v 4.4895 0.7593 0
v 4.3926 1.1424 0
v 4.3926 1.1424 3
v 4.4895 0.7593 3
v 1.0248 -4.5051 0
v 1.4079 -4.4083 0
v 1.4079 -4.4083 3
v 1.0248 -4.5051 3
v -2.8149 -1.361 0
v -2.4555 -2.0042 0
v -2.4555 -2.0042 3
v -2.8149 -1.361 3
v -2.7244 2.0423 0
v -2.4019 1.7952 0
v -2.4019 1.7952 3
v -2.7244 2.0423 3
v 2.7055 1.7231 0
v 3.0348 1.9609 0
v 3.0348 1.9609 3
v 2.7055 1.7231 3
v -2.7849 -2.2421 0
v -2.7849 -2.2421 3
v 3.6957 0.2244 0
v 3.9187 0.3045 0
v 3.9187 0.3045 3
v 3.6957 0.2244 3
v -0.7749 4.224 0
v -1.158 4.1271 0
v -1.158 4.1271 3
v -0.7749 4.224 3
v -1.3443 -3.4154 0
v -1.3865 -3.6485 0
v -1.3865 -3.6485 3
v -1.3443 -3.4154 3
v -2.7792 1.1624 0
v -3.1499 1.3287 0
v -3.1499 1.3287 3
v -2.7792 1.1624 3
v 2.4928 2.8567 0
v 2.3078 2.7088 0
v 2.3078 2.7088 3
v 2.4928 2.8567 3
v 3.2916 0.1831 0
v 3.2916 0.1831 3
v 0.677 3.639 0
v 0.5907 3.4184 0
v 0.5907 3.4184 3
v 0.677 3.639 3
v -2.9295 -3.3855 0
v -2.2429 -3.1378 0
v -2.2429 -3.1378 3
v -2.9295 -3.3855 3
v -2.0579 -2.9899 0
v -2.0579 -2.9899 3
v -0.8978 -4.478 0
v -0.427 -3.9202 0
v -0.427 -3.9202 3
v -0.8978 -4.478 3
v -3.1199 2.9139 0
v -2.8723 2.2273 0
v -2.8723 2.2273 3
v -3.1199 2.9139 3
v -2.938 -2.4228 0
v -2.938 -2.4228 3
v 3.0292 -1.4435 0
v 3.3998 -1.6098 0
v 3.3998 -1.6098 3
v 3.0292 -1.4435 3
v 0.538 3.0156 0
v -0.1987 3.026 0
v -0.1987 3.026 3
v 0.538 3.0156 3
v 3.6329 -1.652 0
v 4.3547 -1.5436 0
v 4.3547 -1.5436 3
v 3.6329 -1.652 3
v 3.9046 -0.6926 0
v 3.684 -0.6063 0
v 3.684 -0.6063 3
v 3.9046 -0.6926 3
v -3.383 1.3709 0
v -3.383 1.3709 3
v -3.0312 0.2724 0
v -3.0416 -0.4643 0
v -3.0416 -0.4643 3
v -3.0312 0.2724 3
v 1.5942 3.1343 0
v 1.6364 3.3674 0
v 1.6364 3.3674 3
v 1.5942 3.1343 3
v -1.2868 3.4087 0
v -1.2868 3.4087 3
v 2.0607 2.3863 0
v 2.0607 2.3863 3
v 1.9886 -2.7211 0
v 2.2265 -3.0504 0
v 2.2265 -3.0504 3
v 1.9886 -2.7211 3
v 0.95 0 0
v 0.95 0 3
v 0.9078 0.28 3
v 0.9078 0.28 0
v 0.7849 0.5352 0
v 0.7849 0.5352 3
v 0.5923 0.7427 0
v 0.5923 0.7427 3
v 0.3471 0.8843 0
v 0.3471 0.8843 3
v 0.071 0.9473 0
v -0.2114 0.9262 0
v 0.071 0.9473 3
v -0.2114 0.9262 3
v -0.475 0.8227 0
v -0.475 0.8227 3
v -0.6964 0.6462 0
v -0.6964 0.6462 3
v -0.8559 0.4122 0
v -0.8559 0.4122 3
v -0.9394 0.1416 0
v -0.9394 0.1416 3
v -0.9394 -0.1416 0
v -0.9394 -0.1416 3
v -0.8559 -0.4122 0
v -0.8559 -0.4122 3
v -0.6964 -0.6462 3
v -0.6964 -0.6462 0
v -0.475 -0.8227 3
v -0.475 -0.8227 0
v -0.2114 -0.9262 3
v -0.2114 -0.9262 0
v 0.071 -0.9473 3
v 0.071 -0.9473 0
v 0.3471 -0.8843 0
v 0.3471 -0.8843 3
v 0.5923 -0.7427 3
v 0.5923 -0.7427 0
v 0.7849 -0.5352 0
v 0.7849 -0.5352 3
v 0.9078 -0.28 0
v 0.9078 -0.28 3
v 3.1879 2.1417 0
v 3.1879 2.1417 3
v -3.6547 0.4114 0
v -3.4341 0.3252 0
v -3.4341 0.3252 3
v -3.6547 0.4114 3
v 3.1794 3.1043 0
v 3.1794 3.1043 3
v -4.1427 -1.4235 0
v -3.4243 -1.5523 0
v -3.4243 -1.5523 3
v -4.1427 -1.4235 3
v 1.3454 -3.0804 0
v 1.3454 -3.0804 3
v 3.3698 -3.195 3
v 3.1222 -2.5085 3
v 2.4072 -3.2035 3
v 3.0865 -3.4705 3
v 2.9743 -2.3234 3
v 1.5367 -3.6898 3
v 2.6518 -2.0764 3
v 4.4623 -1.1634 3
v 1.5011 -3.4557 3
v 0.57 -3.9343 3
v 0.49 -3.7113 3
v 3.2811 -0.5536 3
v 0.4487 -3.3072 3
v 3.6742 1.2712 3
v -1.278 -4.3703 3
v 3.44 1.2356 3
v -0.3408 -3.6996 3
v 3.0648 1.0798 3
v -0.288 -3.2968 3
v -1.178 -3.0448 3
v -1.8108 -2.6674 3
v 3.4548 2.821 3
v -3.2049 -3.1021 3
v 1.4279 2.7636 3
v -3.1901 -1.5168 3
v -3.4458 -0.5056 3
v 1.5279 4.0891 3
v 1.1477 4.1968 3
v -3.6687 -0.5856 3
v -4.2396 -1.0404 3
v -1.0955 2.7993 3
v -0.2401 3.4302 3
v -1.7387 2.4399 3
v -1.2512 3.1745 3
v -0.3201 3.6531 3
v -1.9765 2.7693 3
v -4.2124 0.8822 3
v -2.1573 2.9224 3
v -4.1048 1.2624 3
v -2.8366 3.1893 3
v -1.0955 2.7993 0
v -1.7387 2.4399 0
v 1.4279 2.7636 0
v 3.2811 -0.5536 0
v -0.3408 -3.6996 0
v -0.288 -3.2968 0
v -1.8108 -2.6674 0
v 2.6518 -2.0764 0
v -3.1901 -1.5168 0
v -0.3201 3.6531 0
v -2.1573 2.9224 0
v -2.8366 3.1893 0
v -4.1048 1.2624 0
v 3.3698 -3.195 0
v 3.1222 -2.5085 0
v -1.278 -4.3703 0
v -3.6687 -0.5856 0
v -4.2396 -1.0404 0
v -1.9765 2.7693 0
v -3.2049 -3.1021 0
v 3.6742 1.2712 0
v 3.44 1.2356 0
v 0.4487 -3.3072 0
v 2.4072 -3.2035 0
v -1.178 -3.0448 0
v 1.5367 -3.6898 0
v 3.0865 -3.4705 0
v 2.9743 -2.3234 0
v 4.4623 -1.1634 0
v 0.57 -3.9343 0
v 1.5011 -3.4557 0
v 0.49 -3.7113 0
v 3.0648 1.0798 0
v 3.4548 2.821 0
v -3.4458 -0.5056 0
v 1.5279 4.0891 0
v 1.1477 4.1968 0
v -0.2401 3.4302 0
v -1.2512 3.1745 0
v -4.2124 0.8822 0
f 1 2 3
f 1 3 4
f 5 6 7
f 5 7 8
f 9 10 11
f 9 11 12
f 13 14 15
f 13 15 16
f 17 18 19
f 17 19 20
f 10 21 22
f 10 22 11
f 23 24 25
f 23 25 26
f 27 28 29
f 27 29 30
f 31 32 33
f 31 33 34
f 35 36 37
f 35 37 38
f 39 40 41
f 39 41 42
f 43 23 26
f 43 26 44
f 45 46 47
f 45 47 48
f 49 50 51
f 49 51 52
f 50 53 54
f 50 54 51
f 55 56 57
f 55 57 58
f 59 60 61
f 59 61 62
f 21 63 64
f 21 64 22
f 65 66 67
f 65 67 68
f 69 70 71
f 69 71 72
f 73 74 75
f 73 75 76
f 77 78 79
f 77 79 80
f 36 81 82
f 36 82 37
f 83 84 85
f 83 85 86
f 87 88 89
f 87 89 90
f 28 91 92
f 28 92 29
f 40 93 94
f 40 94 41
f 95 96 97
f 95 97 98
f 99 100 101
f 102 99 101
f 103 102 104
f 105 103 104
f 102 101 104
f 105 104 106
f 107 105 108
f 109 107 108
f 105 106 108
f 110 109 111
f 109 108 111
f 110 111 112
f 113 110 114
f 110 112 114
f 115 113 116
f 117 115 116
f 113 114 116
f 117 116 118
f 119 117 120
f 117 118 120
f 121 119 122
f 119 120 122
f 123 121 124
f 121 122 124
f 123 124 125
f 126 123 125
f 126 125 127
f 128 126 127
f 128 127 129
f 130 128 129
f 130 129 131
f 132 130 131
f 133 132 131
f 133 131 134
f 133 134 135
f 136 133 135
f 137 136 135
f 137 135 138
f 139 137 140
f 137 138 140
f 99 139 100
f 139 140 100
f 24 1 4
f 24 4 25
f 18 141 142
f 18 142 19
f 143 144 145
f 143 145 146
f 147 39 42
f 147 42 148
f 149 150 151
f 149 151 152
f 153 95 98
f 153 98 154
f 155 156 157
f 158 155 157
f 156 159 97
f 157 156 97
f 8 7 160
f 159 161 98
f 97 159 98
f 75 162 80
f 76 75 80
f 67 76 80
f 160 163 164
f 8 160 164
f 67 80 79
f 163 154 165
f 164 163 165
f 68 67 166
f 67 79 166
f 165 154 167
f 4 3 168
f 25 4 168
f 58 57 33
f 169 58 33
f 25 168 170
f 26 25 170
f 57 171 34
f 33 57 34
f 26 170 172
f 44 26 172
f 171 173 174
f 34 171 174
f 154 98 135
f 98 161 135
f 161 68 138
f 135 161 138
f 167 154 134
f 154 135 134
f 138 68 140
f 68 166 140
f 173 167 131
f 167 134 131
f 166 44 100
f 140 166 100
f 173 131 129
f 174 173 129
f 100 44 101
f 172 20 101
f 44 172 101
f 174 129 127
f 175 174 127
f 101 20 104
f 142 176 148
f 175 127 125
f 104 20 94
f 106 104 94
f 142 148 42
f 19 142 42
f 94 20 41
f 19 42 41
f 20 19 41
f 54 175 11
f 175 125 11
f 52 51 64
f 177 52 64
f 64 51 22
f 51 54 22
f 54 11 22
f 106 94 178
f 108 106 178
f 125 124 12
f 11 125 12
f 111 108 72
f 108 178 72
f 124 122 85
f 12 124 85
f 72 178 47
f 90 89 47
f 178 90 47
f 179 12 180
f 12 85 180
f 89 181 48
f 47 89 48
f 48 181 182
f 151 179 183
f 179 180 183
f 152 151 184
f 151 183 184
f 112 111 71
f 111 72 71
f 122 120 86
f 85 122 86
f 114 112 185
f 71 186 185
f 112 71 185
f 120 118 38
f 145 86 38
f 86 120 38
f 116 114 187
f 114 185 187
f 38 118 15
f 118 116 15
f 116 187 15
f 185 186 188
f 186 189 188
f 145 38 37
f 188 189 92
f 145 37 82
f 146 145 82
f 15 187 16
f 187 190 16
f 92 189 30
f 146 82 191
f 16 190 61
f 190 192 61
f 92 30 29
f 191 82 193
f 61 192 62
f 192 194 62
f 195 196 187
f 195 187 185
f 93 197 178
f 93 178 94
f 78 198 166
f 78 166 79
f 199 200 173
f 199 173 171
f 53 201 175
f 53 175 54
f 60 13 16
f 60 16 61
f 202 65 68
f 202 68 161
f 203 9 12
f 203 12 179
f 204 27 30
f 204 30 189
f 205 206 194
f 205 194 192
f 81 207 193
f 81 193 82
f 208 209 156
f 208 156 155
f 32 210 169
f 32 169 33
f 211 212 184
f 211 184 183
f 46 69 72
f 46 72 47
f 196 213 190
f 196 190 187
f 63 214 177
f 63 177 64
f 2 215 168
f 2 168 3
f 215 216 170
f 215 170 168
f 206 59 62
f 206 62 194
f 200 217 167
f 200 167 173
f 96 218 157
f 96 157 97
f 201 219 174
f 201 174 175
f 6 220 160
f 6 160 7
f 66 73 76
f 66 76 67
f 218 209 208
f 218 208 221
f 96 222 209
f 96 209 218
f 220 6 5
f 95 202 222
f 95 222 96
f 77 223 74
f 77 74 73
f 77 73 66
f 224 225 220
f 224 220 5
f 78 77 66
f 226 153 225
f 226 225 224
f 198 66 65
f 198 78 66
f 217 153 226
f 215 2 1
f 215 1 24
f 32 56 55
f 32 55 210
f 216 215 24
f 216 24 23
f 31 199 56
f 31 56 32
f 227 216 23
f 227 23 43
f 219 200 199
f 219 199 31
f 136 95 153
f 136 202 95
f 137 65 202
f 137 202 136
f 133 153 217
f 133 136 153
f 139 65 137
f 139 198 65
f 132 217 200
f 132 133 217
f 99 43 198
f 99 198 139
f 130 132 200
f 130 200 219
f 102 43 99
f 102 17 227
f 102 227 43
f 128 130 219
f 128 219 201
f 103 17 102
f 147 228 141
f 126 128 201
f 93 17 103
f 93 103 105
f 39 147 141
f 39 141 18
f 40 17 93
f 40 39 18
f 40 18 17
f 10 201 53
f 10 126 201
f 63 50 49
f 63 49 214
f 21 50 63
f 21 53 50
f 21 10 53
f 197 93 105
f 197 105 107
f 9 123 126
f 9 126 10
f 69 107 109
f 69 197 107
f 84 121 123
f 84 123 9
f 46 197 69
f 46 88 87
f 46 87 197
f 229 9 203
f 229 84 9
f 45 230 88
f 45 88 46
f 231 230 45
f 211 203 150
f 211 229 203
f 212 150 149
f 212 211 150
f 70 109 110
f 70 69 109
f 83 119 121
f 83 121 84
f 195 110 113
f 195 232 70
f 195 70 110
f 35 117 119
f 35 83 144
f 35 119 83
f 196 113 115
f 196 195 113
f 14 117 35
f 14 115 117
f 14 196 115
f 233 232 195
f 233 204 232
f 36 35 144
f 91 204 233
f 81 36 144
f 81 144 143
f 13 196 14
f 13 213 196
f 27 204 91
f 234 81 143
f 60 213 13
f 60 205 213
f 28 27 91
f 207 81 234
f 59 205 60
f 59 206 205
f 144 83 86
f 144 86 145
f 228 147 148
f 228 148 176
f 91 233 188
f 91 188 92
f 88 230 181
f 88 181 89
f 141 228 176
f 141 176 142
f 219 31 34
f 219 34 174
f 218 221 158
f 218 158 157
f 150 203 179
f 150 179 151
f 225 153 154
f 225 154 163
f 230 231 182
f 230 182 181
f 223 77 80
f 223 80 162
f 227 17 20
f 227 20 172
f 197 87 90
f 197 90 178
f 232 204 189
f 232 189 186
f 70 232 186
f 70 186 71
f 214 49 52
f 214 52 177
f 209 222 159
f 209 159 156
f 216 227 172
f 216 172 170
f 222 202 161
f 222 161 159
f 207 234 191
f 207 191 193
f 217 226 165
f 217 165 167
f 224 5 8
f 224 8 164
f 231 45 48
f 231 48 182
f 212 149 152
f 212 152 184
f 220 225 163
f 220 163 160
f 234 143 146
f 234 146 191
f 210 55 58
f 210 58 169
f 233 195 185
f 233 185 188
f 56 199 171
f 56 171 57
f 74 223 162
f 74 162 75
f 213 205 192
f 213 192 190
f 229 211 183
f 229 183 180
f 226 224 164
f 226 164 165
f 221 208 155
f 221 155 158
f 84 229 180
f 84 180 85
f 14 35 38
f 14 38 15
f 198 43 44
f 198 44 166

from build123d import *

# Parameters (mm, degrees)
BOSS_EXTRUDE1_DEPTH = 3
SKETCH2_R           = 0.95
CUT_EXTRUDE1_DEPTH  = 3


with BuildPart() as part:
    # Model → Boss-Extrude1 (new body)
    with BuildSketch(Plane.XY):
        Polygon((3.28114864, -0.553591744), (3.683973872, -0.606311596), (3.904576525, -0.692596416), (4.46233576, -1.16335455), (4.354682595, -1.543555198), (3.63291812, -1.652020067), (3.399826682, -1.609842083), (3.029159111, -1.443549864), (2.651791815, -2.076361715), (2.974290661, -2.323428597), (3.122197977, -2.508452992), (3.369848791, -3.195022478), (3.08652147, -3.47046279), (2.407220835, -3.20351854), (2.226450258, -3.050441439), (1.98859116, -2.721092688), (1.345375685, -3.080440385), (1.501144473, -3.455651839), (1.536726867, -3.689840852), (1.407911756, -4.40825247), (1.024820816, -4.505118707), (0.570002205, -3.934287195), (0.489986205, -3.711334195), (0.448670194, -3.307180093), (-0.288044489, -3.296769041), (-0.340764213, -3.69959429), (-0.427049372, -3.92019681), (-0.897807506, -4.477956045), (-1.278008415, -4.370303805), (-1.386473285, -3.64853933), (-1.344295476, -3.415447861), (-1.178003257, -3.04478029), (-1.810815108, -2.667412994), (-2.05788199, -2.98991184), (-2.242905897, -3.137819766), (-2.929475702, -3.385469696), (-3.204916014, -3.102142375), (-2.937971765, -2.422841739), (-2.784894663, -2.242071162), (-2.455545912, -2.004212065), (-2.814890389, -1.360994791), (-3.190106124, -1.516753266), (-3.424295137, -1.55233566), (-4.142706929, -1.423521518), (-4.239572929, -1.040430518), (-3.668740929, -0.585612518), (-3.445787929, -0.505596518), (-3.041633929, -0.464279518), (-3.031233208, 0.272435311), (-3.434058457, 0.325155035), (-3.65466111, 0.411439855), (-4.212419929, 0.882198482), (-4.104767689, 1.262399392), (-3.383003067, 1.370863283), (-3.149911423, 1.328686443), (-2.779244225, 1.162393392), (-2.401877369, 1.795205505), (-2.724376698, 2.042271757), (-2.872284136, 2.227296053), (-3.119934385, 2.913865744), (-2.836607064, 3.189306056), (-2.157306429, 2.922361806), (-1.976536269, 2.769284211), (-1.738676514, 2.439935935), (-1.09545924, 2.799280412), (-1.251217361, 3.174496294), (-1.286799755, 3.408685307), (-1.157985613, 4.127097098), (-0.774894613, 4.223963098), (-0.320076613, 3.653131098), (-0.240060613, 3.430178098), (-0.198743613, 3.026024098), (0.53797107, 3.015613046), (0.590690923, 3.418438278), (0.676975742, 3.639040931), (1.147733877, 4.196800166), (1.527934524, 4.089147), (1.636398415, 3.367382378), (1.5942214, 3.134290766), (1.427928349, 2.763623568), (2.060740462, 2.386256712), (2.307806714, 2.708756041), (2.492831498, 2.856662868), (3.179400869, 3.104314002), (3.454841181, 2.820986681), (3.187896932, 2.141686046), (3.03481983, 1.960915469), (2.705471079, 1.723056371), (3.064815556, 1.079839097), (3.440031438, 1.235597218), (3.674220451, 1.271179612), (4.392632069, 1.142364502), (4.489498306, 0.759273562), (3.918666794, 0.30445495), (3.695713794, 0.22443895), (3.291559693, 0.18312294), align=None)
    extrude(amount=BOSS_EXTRUDE1_DEPTH)

    # Sketch2 → Cut-Extrude1 (cut)
    with BuildSketch(Plane.XY.offset(3)):
        Circle(SKETCH2_R)
    extrude(amount=-CUT_EXTRUDE1_DEPTH, mode=Mode.SUBTRACT)


solid = part.part
